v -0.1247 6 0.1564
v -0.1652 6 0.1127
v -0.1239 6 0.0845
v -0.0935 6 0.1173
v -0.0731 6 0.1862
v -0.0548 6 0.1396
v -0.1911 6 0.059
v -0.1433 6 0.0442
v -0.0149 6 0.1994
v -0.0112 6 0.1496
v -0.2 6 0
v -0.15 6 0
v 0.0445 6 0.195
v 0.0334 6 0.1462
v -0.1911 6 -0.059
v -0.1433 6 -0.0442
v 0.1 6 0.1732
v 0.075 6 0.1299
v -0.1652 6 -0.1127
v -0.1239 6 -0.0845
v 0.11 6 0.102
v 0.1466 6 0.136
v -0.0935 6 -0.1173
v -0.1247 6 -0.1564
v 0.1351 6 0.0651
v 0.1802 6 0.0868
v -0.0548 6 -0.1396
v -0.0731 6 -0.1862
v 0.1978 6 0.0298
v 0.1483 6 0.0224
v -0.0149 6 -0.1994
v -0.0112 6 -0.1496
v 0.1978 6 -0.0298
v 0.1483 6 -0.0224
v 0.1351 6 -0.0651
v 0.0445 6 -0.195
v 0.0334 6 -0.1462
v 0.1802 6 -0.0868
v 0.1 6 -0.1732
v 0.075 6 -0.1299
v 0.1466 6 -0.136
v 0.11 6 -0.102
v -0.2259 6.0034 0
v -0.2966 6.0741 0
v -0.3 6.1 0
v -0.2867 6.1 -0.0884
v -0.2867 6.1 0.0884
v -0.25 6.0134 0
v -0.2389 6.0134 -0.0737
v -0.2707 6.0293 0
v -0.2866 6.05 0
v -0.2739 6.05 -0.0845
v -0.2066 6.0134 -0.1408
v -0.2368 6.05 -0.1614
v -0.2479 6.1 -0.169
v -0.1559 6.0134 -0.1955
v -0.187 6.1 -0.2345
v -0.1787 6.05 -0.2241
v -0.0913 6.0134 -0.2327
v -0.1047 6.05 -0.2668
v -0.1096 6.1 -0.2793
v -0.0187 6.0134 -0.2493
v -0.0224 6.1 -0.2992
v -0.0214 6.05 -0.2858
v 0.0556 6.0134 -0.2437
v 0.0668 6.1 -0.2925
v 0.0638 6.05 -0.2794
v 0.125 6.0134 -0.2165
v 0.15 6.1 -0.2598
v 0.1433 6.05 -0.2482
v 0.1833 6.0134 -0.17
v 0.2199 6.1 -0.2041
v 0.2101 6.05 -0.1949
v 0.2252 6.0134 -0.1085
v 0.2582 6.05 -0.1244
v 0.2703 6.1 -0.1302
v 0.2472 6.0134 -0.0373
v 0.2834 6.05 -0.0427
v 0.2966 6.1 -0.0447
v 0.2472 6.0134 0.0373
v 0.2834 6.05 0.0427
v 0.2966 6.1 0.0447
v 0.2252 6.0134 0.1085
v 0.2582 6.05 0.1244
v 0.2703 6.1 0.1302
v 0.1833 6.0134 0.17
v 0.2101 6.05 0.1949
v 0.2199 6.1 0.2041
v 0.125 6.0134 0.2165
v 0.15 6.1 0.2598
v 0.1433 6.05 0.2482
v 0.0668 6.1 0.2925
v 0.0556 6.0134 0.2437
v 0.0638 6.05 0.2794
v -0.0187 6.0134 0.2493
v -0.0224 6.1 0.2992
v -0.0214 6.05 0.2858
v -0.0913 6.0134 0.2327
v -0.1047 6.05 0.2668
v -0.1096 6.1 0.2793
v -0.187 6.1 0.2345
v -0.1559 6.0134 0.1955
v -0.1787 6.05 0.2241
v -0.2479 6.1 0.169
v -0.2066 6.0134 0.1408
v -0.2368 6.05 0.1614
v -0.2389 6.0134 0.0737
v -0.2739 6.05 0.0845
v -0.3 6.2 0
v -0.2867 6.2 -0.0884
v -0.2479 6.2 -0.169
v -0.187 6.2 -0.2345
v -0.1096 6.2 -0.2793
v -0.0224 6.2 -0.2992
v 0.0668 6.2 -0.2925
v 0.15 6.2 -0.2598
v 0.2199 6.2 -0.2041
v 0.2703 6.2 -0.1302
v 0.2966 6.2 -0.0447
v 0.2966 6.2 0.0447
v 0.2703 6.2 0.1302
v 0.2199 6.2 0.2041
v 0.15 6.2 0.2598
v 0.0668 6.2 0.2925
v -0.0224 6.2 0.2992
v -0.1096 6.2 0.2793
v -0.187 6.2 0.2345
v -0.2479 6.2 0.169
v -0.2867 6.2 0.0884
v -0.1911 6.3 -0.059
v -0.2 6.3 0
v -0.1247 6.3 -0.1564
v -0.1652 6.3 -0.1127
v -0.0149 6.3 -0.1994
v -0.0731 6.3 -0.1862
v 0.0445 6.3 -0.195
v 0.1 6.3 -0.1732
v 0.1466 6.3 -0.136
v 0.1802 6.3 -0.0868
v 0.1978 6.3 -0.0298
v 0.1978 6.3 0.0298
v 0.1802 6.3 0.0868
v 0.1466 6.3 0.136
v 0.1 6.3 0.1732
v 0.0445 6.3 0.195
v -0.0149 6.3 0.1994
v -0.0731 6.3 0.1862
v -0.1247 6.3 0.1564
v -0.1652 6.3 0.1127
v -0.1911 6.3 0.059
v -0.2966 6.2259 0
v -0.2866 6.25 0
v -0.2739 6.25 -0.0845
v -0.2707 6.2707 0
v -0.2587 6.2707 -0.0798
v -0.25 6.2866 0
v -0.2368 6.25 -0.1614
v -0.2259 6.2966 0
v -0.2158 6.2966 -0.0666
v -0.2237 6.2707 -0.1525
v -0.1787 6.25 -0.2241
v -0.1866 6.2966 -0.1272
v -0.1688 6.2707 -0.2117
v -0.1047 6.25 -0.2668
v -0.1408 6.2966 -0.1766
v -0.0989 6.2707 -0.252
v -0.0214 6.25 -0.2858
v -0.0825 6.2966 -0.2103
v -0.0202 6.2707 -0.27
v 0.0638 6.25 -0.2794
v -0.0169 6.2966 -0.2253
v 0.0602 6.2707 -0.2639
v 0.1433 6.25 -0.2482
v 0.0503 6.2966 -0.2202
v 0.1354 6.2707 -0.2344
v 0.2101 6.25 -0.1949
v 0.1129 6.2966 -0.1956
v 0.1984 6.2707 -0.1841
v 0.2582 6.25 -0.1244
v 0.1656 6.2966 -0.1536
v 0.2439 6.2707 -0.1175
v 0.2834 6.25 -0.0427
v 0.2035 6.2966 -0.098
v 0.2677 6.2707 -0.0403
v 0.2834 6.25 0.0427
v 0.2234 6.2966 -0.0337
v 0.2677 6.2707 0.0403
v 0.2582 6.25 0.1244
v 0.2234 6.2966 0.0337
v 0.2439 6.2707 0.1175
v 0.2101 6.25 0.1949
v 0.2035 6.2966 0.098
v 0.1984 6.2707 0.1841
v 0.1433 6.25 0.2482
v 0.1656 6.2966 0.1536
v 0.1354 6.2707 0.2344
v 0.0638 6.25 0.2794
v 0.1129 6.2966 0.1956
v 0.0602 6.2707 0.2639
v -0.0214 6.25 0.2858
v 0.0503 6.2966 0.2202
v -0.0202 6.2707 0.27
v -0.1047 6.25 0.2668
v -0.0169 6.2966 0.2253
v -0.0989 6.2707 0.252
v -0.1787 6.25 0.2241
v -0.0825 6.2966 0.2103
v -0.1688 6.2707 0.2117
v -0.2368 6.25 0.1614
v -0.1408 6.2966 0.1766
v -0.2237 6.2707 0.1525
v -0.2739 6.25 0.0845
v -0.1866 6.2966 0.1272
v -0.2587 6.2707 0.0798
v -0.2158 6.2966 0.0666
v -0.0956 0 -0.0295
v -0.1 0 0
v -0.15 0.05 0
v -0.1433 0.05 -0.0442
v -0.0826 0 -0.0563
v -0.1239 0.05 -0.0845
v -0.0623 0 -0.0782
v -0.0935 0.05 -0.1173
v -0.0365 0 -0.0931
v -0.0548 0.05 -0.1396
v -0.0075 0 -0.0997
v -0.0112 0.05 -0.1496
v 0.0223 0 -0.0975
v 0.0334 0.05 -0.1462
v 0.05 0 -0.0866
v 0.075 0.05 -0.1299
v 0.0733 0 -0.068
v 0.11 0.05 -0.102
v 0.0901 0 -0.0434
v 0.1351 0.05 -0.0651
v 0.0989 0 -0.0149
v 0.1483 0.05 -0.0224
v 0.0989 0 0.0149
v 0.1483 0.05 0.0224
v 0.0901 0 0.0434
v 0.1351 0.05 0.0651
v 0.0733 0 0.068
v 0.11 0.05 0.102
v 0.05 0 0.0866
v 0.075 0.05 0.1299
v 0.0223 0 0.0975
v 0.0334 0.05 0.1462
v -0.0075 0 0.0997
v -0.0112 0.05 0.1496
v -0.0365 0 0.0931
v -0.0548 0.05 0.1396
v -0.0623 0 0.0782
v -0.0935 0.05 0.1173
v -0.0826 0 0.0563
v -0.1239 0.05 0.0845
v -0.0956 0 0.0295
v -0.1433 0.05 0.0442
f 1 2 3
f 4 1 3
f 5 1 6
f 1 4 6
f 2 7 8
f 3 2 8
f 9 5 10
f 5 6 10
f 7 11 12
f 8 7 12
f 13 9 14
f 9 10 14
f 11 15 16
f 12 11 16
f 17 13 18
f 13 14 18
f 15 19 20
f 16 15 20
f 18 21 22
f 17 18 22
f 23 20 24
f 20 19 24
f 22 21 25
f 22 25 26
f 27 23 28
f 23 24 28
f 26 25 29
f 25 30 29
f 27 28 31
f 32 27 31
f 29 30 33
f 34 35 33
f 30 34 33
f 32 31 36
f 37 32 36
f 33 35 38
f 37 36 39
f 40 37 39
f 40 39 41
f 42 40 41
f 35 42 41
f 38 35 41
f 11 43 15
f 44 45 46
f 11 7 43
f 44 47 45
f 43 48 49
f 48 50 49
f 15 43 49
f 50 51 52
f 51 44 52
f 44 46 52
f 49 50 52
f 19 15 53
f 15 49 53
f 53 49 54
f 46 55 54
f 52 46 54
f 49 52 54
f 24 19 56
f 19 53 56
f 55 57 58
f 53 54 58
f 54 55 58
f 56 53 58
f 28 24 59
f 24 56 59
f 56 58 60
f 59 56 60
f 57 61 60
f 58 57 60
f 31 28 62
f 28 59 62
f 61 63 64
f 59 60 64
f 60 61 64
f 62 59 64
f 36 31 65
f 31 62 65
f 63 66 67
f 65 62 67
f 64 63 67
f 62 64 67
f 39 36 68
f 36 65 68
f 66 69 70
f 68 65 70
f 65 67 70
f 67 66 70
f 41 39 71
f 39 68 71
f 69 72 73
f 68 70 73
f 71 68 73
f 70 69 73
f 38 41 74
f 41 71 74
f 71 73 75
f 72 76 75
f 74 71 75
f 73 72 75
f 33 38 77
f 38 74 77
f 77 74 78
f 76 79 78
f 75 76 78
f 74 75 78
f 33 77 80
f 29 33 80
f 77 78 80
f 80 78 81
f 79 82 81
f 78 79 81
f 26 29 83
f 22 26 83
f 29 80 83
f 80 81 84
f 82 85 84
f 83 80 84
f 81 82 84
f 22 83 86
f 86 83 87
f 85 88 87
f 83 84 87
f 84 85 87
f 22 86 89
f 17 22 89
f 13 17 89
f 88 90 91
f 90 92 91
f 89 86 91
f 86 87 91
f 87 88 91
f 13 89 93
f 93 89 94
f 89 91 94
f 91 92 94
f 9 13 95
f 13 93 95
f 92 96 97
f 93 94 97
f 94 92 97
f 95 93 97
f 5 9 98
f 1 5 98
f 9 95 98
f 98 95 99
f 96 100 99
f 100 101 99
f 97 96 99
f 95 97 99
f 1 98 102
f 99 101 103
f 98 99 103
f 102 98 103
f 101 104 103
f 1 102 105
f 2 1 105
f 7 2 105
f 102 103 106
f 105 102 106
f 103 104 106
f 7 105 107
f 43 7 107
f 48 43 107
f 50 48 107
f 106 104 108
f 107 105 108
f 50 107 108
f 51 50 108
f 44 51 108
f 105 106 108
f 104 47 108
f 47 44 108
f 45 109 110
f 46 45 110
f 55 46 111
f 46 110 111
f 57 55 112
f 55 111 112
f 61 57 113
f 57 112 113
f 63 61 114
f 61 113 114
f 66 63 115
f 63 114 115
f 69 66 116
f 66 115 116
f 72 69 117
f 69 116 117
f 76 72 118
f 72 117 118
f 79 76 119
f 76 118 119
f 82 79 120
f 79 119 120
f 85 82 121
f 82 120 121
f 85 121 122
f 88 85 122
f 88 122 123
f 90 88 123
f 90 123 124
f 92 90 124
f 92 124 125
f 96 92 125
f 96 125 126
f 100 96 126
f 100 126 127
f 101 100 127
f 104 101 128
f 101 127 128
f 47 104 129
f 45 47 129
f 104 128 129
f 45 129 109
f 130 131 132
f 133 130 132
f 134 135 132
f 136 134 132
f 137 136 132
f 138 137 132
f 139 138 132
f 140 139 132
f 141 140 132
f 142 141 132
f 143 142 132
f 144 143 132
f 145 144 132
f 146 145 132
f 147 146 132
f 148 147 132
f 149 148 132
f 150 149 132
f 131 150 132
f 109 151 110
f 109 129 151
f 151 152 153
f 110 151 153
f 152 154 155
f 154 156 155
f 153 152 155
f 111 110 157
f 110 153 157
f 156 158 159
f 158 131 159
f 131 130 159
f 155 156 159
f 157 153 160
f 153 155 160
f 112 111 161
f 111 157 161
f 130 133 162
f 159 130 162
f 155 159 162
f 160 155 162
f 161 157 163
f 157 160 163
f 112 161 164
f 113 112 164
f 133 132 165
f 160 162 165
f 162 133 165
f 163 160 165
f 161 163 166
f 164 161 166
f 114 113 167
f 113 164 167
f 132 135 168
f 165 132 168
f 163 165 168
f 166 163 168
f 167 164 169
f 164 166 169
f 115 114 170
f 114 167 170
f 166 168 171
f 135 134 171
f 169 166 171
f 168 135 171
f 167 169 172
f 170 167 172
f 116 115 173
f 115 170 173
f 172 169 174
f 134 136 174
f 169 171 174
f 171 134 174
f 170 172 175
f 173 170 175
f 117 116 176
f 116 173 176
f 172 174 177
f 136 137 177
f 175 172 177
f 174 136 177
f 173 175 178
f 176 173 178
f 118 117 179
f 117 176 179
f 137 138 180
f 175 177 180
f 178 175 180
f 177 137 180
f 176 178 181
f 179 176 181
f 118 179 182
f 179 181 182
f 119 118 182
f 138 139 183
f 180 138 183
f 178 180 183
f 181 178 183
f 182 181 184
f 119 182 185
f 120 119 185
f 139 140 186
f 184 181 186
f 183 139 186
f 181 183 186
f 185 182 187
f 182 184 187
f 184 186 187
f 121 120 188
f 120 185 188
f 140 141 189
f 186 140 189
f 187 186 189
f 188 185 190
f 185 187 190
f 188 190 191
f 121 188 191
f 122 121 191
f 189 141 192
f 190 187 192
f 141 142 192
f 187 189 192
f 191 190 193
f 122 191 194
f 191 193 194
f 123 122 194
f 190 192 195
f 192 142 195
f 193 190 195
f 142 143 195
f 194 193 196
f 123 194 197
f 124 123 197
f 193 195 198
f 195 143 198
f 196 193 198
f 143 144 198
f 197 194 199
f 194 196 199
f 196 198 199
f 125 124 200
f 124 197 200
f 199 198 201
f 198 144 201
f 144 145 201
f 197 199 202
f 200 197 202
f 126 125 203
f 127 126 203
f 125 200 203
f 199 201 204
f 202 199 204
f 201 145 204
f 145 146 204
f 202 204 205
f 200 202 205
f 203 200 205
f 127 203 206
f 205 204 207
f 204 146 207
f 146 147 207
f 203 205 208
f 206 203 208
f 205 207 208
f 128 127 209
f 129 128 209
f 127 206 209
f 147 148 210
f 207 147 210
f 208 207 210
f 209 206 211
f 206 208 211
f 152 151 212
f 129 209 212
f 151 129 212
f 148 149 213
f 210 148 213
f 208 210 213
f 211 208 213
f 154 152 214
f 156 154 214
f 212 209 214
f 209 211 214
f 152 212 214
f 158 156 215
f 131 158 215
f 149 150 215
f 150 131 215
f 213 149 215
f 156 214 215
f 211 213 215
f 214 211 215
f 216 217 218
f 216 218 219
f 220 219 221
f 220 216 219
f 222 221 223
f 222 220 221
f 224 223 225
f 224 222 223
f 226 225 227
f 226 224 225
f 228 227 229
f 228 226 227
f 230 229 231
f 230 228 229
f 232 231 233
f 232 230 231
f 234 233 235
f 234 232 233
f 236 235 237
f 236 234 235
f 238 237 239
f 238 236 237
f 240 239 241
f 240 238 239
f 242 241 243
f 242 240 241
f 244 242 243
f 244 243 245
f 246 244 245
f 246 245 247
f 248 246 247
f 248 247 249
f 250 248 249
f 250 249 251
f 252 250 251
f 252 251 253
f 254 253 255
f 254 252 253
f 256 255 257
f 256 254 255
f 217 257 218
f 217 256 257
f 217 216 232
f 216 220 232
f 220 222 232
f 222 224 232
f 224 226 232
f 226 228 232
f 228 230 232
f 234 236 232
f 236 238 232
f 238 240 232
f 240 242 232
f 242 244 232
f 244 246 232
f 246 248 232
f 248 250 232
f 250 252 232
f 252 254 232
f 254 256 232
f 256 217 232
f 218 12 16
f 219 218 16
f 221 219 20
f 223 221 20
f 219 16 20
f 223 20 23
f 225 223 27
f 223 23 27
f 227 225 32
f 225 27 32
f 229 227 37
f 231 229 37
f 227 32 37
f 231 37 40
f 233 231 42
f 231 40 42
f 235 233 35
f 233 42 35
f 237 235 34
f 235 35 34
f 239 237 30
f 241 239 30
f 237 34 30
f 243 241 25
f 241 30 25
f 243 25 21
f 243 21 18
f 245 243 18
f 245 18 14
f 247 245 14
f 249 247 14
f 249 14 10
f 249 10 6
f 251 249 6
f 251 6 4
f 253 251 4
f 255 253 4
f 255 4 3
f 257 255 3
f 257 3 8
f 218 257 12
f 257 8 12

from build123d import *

# Parameters (mm, degrees)
FILLET1_R     = 0.1
CHAMFER1_SIZE = 0.05


with BuildPart() as part:
    # Sketch2 → Revolve1 (revolve)
    with BuildSketch(Plane.XY, mode=Mode.PRIVATE) as revolve1_sk:
        Polygon((0, 0), (0.15, 0), (0.15, 6), (0.3, 6), (0.3, 6.3), (0, 6.3), align=None)
    revolve(revolve1_sk.sketch.rotate(Axis((0, 6.3, 0), (0, -1, 0)), 180), axis=Axis((0, 6.3, 0), (0, -1, 0)))

    # Fillet1
    fillet1_edges = [part.edges().sort_by_distance(p)[0] for p in [
        (0.3, 6.3, 0),
        (0.3, 6, 0),
    ]]
    fillet(fillet1_edges, radius=FILLET1_R)

    # Chamfer1
    chamfer1_edges = [part.edges().sort_by_distance(p)[0] for p in [
        (0.15, 0, 0),
    ]]
    chamfer(chamfer1_edges, length=CHAMFER1_SIZE)


solid = part.part
